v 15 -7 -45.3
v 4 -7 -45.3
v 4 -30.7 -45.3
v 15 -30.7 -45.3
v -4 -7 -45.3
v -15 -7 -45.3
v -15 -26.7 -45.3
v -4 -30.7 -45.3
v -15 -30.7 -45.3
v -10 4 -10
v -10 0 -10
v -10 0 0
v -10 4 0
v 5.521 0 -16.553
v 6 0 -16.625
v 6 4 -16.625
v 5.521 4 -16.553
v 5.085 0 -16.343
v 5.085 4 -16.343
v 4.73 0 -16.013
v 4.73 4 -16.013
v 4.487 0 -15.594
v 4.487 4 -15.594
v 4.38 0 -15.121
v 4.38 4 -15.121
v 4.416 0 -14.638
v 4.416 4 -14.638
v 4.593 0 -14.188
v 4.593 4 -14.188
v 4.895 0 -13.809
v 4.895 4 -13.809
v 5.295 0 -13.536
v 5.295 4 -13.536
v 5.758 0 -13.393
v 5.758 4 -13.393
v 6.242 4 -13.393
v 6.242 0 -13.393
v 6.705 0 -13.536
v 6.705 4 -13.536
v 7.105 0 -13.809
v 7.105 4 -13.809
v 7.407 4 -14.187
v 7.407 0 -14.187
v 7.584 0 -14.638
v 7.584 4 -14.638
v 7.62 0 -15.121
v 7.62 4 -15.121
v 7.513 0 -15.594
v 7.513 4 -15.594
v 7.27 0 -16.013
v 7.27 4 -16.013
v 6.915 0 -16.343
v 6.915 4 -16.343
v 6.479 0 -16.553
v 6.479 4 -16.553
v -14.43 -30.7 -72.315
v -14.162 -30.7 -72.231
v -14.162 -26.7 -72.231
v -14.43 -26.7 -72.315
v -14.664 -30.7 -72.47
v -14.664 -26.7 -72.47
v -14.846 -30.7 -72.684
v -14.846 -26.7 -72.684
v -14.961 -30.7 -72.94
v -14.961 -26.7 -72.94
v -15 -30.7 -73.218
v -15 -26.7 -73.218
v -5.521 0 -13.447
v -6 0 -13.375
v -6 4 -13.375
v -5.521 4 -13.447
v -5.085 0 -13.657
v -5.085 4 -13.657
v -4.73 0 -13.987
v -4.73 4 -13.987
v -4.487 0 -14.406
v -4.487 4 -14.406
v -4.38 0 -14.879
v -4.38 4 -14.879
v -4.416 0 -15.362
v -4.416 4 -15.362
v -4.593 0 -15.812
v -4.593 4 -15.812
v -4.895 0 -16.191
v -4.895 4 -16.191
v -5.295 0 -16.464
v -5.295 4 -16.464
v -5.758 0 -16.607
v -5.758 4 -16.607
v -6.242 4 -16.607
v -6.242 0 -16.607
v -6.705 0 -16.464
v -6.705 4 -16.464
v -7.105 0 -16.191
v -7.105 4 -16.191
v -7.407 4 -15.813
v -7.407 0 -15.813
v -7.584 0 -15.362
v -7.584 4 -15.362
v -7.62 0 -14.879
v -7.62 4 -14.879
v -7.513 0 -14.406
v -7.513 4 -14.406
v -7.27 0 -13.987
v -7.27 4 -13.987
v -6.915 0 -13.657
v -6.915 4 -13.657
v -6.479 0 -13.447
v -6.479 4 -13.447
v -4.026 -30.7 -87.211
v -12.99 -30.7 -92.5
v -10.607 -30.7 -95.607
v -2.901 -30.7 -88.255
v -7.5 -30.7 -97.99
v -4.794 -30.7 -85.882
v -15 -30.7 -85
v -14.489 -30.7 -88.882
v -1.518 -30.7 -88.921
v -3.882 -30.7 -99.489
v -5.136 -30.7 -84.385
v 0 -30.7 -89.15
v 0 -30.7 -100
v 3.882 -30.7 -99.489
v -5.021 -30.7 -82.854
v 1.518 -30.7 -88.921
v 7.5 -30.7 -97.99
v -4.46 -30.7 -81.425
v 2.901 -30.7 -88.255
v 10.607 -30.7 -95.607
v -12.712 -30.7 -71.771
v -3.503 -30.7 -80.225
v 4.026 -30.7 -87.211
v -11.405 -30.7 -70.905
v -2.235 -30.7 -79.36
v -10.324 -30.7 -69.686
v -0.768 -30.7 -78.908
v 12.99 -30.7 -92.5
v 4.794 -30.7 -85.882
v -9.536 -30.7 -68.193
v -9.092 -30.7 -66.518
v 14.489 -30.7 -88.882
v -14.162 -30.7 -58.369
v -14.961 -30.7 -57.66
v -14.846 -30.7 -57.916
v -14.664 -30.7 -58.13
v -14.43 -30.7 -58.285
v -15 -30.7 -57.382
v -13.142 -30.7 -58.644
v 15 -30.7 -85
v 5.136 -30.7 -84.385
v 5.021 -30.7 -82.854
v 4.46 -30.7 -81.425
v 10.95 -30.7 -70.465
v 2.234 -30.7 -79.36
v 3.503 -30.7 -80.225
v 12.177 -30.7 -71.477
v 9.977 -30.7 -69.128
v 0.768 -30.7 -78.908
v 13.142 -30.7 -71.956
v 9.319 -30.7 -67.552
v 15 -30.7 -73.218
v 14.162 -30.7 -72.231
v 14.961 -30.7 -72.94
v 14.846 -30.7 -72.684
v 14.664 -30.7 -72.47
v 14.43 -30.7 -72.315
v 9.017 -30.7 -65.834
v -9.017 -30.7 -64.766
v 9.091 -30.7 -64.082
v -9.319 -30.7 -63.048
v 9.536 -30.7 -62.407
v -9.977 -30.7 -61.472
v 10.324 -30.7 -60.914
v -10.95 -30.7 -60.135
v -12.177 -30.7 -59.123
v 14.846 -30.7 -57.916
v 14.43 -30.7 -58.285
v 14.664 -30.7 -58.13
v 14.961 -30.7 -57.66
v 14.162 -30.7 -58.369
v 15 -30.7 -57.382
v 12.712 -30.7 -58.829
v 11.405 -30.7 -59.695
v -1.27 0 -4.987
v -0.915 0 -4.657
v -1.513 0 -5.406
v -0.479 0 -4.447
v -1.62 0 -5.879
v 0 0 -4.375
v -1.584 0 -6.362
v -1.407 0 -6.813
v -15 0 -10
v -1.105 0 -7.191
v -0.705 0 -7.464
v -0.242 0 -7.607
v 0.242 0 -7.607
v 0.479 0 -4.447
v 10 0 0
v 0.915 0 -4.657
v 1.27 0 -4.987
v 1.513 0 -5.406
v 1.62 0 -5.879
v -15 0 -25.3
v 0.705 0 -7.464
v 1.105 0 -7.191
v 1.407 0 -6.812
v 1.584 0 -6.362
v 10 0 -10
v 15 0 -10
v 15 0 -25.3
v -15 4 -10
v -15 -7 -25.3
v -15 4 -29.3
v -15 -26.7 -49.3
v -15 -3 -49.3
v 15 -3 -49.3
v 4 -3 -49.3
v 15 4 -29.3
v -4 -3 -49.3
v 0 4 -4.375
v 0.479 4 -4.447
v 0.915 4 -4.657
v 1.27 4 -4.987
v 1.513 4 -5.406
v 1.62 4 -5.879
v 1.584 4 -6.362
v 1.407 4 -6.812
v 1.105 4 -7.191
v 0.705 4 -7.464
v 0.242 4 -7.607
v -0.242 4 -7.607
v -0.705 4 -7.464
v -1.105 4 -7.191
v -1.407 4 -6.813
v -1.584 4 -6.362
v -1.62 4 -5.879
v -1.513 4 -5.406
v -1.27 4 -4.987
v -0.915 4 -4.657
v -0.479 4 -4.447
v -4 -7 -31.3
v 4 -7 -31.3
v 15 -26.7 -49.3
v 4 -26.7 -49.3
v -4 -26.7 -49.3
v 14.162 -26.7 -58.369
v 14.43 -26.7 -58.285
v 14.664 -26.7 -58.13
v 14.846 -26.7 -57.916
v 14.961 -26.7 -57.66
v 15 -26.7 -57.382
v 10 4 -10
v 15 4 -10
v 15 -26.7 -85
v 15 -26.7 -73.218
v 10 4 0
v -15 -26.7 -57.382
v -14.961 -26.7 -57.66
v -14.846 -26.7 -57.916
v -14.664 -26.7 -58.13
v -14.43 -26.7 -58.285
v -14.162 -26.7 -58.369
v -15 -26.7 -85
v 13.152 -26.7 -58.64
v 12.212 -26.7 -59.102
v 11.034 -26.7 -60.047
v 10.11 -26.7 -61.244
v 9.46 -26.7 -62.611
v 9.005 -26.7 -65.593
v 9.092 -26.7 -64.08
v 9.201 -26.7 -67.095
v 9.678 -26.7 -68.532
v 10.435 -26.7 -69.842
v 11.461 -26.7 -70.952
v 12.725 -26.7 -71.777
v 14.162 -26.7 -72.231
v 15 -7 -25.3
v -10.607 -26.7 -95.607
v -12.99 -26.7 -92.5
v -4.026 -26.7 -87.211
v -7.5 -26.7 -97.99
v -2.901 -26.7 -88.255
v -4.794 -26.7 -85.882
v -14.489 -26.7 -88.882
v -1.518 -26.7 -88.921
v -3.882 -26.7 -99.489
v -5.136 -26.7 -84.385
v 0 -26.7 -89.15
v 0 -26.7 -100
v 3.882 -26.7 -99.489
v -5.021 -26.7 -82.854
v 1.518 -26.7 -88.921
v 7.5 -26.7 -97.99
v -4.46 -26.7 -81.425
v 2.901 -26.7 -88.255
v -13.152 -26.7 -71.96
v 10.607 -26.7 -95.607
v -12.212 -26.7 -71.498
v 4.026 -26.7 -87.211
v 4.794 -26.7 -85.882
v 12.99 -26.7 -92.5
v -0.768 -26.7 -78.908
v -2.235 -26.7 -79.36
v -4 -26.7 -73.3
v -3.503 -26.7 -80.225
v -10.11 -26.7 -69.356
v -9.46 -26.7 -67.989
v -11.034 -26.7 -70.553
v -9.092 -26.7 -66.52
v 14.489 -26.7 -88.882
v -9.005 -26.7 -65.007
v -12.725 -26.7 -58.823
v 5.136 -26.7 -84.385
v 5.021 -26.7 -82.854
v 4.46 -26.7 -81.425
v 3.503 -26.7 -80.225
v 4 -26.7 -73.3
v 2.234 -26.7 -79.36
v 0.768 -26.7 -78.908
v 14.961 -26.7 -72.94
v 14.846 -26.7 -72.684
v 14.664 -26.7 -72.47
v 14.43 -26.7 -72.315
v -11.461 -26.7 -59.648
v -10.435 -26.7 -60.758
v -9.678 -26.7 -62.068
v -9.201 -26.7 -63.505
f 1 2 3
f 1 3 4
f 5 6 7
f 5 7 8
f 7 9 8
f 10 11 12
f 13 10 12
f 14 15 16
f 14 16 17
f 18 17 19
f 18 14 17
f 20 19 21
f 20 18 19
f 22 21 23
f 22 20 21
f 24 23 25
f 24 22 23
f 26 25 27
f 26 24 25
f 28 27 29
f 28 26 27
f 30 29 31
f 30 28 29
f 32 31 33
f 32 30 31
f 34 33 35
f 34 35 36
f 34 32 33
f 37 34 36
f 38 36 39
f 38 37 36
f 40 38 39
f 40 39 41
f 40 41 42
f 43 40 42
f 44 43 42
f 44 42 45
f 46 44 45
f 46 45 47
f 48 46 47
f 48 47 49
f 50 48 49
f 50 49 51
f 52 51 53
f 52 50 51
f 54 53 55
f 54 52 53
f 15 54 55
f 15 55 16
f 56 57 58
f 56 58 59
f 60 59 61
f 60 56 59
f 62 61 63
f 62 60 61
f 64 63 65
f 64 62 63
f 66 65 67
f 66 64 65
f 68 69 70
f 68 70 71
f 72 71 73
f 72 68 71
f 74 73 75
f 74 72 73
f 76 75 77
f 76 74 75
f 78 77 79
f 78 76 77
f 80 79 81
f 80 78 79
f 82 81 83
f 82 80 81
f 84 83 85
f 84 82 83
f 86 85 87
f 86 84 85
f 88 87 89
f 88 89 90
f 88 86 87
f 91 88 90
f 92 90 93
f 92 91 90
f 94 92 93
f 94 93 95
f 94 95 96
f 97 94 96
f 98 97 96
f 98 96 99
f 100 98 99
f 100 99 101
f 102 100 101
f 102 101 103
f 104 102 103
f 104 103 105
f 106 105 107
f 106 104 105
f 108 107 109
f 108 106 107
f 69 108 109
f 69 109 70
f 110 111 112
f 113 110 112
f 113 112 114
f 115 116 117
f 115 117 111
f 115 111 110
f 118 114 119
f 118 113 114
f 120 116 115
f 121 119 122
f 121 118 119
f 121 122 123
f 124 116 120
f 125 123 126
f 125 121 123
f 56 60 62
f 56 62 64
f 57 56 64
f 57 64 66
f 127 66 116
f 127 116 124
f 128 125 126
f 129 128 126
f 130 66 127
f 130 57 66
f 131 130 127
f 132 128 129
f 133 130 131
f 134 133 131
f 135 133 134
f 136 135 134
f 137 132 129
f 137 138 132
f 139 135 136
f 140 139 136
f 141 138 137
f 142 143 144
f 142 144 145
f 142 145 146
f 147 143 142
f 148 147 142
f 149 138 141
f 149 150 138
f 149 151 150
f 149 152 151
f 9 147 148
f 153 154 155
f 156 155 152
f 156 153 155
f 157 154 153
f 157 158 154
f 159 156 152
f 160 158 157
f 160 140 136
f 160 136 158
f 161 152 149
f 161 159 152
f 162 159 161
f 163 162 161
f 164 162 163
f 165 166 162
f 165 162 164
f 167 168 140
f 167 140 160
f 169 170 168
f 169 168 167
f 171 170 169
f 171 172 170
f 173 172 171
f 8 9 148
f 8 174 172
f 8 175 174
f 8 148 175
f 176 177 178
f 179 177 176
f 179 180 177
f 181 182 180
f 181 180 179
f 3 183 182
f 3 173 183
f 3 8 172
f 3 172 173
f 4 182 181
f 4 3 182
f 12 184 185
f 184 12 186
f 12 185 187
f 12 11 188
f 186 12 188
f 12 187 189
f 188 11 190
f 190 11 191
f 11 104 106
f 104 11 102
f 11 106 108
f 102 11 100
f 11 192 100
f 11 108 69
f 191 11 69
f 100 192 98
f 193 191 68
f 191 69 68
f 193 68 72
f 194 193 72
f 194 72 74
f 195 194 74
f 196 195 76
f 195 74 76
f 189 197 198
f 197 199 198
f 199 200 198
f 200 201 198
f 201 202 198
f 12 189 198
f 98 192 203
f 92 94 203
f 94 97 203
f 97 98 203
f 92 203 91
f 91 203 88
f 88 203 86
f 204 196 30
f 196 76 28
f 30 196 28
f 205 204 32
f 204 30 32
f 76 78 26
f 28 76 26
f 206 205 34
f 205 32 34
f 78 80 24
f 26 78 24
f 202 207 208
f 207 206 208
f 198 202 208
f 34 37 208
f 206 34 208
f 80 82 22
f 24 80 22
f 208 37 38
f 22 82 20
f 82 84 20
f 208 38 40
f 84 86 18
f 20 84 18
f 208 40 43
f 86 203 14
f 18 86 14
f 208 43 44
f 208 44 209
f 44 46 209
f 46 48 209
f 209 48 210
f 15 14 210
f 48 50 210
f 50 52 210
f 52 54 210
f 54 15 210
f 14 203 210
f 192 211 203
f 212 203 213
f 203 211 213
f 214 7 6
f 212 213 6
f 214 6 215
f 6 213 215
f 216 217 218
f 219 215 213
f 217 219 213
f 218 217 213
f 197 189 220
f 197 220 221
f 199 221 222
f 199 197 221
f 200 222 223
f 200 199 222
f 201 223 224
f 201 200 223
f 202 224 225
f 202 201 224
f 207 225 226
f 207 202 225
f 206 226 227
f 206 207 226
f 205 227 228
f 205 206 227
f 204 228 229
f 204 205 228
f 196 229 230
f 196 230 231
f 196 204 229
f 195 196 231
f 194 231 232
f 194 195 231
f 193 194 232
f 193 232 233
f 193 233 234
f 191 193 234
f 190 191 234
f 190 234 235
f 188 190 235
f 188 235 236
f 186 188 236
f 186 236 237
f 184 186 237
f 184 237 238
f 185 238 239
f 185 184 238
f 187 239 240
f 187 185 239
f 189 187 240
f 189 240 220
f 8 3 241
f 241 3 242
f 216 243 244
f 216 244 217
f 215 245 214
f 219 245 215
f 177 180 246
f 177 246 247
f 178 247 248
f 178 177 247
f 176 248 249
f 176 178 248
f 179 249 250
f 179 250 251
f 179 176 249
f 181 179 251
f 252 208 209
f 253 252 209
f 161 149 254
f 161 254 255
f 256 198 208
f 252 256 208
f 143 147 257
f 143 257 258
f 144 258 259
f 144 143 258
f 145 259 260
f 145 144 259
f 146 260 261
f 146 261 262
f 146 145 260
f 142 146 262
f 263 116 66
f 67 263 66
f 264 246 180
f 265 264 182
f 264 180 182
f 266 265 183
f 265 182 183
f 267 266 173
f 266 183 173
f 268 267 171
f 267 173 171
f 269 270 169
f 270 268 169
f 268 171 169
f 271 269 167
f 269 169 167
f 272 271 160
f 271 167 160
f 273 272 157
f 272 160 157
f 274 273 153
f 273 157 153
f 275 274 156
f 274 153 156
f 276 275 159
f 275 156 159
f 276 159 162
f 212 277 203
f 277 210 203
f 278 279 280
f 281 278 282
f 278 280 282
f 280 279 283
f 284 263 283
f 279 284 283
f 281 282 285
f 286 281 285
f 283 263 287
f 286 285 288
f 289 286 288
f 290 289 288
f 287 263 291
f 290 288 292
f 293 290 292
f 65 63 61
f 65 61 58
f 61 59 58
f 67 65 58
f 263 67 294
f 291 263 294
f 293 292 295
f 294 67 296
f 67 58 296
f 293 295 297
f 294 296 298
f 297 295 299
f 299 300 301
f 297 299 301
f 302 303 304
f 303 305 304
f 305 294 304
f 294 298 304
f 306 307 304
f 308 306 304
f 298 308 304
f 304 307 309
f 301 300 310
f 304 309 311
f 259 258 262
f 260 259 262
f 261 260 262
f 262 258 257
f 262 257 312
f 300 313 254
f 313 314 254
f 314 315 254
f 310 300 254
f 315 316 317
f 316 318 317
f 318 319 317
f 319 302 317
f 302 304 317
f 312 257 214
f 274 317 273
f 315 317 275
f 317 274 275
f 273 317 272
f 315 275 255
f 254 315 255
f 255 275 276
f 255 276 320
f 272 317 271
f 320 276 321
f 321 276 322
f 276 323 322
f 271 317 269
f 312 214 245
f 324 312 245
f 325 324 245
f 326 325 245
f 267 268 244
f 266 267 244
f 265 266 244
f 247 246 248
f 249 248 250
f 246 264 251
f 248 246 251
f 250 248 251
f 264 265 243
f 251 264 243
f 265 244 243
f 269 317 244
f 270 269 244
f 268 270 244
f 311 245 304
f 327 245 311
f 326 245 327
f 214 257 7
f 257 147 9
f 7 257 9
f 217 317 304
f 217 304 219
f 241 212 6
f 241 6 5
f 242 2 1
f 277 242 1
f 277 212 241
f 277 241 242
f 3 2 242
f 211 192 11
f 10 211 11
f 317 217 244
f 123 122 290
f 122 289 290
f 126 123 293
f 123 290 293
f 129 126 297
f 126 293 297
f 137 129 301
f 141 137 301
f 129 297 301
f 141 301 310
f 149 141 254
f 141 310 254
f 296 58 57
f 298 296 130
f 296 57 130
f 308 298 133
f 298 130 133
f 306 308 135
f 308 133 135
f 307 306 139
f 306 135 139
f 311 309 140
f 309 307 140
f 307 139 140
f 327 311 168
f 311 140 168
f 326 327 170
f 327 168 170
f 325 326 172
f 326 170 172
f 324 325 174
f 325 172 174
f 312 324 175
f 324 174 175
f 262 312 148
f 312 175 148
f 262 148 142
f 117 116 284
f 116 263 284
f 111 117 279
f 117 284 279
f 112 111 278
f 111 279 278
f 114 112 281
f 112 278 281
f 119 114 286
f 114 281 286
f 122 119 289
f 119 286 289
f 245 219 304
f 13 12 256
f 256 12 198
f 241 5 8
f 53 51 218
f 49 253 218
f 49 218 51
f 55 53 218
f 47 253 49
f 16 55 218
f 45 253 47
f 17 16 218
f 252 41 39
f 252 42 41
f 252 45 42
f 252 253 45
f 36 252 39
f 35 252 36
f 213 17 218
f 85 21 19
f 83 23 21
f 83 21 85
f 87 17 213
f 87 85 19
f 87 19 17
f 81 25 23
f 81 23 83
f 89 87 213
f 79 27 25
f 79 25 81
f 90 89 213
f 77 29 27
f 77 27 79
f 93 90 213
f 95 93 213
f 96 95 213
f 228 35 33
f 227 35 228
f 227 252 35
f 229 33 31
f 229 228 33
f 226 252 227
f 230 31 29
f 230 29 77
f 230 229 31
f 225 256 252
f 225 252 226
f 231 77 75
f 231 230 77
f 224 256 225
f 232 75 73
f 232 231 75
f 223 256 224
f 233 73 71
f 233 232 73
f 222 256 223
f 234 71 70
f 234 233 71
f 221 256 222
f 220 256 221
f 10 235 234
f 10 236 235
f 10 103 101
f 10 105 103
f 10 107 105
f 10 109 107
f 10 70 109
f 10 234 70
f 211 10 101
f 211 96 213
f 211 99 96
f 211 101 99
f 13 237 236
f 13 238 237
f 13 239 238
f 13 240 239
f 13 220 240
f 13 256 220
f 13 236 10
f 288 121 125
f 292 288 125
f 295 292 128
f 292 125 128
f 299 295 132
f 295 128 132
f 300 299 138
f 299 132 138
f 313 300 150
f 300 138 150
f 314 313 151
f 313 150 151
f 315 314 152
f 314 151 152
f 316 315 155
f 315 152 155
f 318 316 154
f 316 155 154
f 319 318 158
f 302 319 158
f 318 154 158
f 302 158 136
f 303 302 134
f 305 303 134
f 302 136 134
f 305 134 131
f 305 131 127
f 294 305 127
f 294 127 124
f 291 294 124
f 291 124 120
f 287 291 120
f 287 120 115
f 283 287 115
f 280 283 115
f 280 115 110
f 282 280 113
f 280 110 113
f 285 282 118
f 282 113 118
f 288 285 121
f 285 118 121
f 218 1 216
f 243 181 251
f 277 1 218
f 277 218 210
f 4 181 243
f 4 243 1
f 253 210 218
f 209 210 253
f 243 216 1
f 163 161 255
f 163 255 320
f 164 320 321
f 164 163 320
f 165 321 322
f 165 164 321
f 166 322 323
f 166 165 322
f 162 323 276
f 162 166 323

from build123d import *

# Parameters (mm, degrees)
SKETCH_1_R           = 1.625
EXTRUDE_1_DEPTH      = 4
SKETCH_2_W           = 30
SKETCH_2_H           = 11
EXTRUDE_2_DEPTH      = 4
SKETCH_3_W           = 30
SKETCH_3_H           = 24
EXTRUDE_3_DEPTH      = 4
EXTRUDE_4_DEPTH      = 30
SKETCH_5_W           = 4
SKETCH_5_H           = 23.7
EXTRUDE_5_DEPTH      = 30
SKETCH_6_W           = 30.00005
SKETCH_6_H           = 54.7
SKETCH_6_R           = 5.15
EXTRUDE_6_DEPTH      = 4
CUT_EXTRUDE_1_REACH  = 108.907
SKETCH_8_RX          = 7
SKETCH_8_RY          = 6
FILLET_START         = -32
FILLET_2_DEPTH       = 6
FILLET_3_R           = 15
EXTRUDE_8_DEPTH      = 4
EXTRUDE_8_DEPTH_BACK = 4
EXTRUDE_9_DEPTH      = 4
EXTRUDE_9_DEPTH_BACK = 4


with BuildPart() as part:
    # Эскиз1 → Бобышка-Вытянуть1 (new body)
    with BuildSketch(Plane(origin=(0, 0, 0), x_dir=(1, 0, 0), z_dir=(0, 1, 0))):
        Polygon((-10, 0), (10, 0), (10, 10), (15, 10), (15, 25.3), (-15, 25.3), (-15, 10), (-10, 10), align=None)
        with Locations(Location((-6, 15, 0), (0, 0, 270))):
            Circle(SKETCH_1_R, mode=Mode.SUBTRACT)
        with Locations(Location((0, 6, 0), (0, 0, 270))):
            Circle(SKETCH_1_R, mode=Mode.SUBTRACT)
        with Locations(Location((6, 15, 0), (0, 0, 90))):
            Circle(SKETCH_1_R, mode=Mode.SUBTRACT)
    extrude(amount=EXTRUDE_1_DEPTH)

    # Эскиз2 → Бобышка-Вытянуть2 (add)
    with BuildSketch(Plane(origin=(0, 0, -25.3), x_dir=(-1, 0, 0), z_dir=(0, 0, -1))):
        with Locations((0, -1.5)):
            Rectangle(SKETCH_2_W, SKETCH_2_H)
    extrude(amount=EXTRUDE_2_DEPTH)

    # Эскиз3 → Бобышка-Вытянуть3 (add)
    with BuildSketch(Plane.XZ.offset(7)):
        with Locations((0, -37.3)):
            Rectangle(SKETCH_3_W, SKETCH_3_H)
    extrude(amount=-EXTRUDE_3_DEPTH)

    # Эскиз4 → Бобышка-Вытянуть4 (add, through all)
    with BuildSketch(Plane.ZY.offset(15)):
        Polygon((-29.3, 4), (-29.3, -3), (-49.3, -3), align=None)
    extrude(amount=-EXTRUDE_4_DEPTH)

    # Эскиз5 → Бобышка-Вытянуть5 (add, through all)
    with BuildSketch(Plane(origin=(15, 0, 0), x_dir=(0, 0, -1), z_dir=(1, 0, 0))):
        with Locations((47.3, -18.85)):
            Rectangle(SKETCH_5_W, SKETCH_5_H)
    extrude(amount=-EXTRUDE_5_DEPTH)

    # Эскиз6 → Бобышка-Вытянуть6 (add)
    with BuildSketch(Plane.XZ.offset(30.7)):
        with Locations((-2.5e-05, -72.65)):
            Rectangle(SKETCH_6_W, SKETCH_6_H)
        with Locations(Location((-2.5e-05, -84, 0), (0, 0, 270))):
            Circle(SKETCH_6_R, mode=Mode.SUBTRACT)
    extrude(amount=-EXTRUDE_6_DEPTH)

    # Эскиз8 → Вырез-Вытянуть1 (cut, up to next)
    with BuildSketch(Plane.XZ.offset(30.7), mode=Mode.PRIVATE) as cut_extrude_1_sk1:
        with Locations(Location((15, -65.3), (0, 0, -90))):
            Ellipse(SKETCH_8_RX, SKETCH_8_RY)
    cut_extrude_1_tool1 = extrude(cut_extrude_1_sk1.sketch, amount=-CUT_EXTRUDE_1_REACH, mode=Mode.PRIVATE) & part.part
    # Эскиз8 → Вырез-Вытянуть1 (cut, up to next)
    with BuildSketch(Plane.XZ.offset(30.7), mode=Mode.PRIVATE) as cut_extrude_1_sk2:
        with Locations(Location((-15.000018282, -65.299986289), (0, 0, -90.000052373))):
            Ellipse(SKETCH_8_RX, SKETCH_8_RY)
    cut_extrude_1_tool2 = extrude(cut_extrude_1_sk2.sketch, amount=-CUT_EXTRUDE_1_REACH, mode=Mode.PRIVATE) & part.part
    add(cut_extrude_1_tool1.solids().sort_by_distance((15, -30.7, -65.3))[0], mode=Mode.SUBTRACT)
    add(cut_extrude_1_tool2.solids().sort_by_distance((-15.000018, -30.7, -65.299986))[0], mode=Mode.SUBTRACT)

    # Скругление2: read off the stored shape, not the designer's step
    # Скругление2 outline → Скругление2 (cut)
    with BuildSketch(Plane(origin=(0, 0, 0), x_dir=(1, 0, 0), z_dir=(0, 1, 0)).offset(FILLET_START)):
        with BuildLine():
            Line((15, 72.3), (15, 73.218180859))
            ThreePointArc((15, 73.218180859), (14.762336304, 72.570999772), (14.162313281, 72.231441583))
            add(Edge.make_bspline(
                [(14.162313281, 72.231441583), (14.579095458, 72.3), (15, 72.3)],
                knots=[6.131749827, 6.131749827, 6.131749827, 6.283185307, 6.283185307, 6.283185307], degree=2, weights=[0.948970652, 0.971763096, 1]))
        make_face()
        with BuildLine():
            add(Edge.make_bspline(
                [(15, 58.3), (14.579095458, 58.3), (14.162313281, 58.368558417)],
                knots=[3.141592654, 3.141592654, 3.141592654, 3.293028134, 3.293028134, 3.293028134], degree=2, weights=[1, 0.971763096, 0.948970652]))
            ThreePointArc((14.162313281, 58.368558417), (14.762336304, 58.029000228), (15, 57.381819141))
            Line((15, 57.381819141), (15, 58.3))
        make_face()
        with BuildLine():
            add(Edge.make_bspline(
                [(-15.00005, 72.299986289), (-14.579143154, 72.299988746), (-14.162358429, 72.231432015)],
                knots=[6.283181087, 6.283181087, 6.283181087, 6.434617466, 6.434617466, 6.434617466], degree=2, weights=[1, 0.971762843, 0.948970209]))
            ThreePointArc((-14.162358429, 72.231432015), (-14.762384713, 72.570989127), (-15.00005, 73.218172089))
            Line((-15.00005, 73.218172089), (-15.00005, 72.299986289))
        make_face()
        with BuildLine():
            ThreePointArc((-15.00005, 57.381799936), (-14.762384538, 58.028983103), (-14.162357897, 58.368540098))
            add(Edge.make_bspline(
                [(-14.162357897, 58.368540098), (-14.579142884, 58.299983554), (-15.00005, 58.299986289)],
                knots=[9.27334784, 9.27334784, 9.27334784, 9.424784314, 9.424784314, 9.424784314], degree=2, weights=[0.948970181, 0.971762826, 1]))
            Line((-15.00005, 58.299986289), (-15.00005, 57.381799936))
        make_face()
    extrude(amount=FILLET_2_DEPTH, mode=Mode.SUBTRACT)

    # Скругление3
    fillet_3_edges = [part.edges().sort_by_distance(p)[0] for p in [
        (-15.00005, -28.7, -100),
        (15, -28.7, -100),
    ]]
    fillet(fillet_3_edges, radius=FILLET_3_R)

    # Эскиз10 → Бобышка-Вытянуть8 (add, two sides: drawn at the far end of the back side and taken through both)
    with BuildSketch(Plane.ZY.offset(2.5e-05).offset(-EXTRUDE_8_DEPTH_BACK)):
        Polygon((-49.3, -26.7), (-73.3, -26.7), (-49.3, -3), align=None)
    extrude(amount=EXTRUDE_8_DEPTH + EXTRUDE_8_DEPTH_BACK)

    # Эскиз11 → Бобышка-Вытянуть9 (add, two sides: drawn at the far end of the back side and taken through both)
    with BuildSketch(Plane.ZY.offset(2.5e-05).offset(-EXTRUDE_9_DEPTH_BACK)):
        Polygon((-31.3, -7), (-45.3, -7), (-45.3, -30.7), align=None)
    extrude(amount=EXTRUDE_9_DEPTH + EXTRUDE_9_DEPTH_BACK)


solid = part.part
